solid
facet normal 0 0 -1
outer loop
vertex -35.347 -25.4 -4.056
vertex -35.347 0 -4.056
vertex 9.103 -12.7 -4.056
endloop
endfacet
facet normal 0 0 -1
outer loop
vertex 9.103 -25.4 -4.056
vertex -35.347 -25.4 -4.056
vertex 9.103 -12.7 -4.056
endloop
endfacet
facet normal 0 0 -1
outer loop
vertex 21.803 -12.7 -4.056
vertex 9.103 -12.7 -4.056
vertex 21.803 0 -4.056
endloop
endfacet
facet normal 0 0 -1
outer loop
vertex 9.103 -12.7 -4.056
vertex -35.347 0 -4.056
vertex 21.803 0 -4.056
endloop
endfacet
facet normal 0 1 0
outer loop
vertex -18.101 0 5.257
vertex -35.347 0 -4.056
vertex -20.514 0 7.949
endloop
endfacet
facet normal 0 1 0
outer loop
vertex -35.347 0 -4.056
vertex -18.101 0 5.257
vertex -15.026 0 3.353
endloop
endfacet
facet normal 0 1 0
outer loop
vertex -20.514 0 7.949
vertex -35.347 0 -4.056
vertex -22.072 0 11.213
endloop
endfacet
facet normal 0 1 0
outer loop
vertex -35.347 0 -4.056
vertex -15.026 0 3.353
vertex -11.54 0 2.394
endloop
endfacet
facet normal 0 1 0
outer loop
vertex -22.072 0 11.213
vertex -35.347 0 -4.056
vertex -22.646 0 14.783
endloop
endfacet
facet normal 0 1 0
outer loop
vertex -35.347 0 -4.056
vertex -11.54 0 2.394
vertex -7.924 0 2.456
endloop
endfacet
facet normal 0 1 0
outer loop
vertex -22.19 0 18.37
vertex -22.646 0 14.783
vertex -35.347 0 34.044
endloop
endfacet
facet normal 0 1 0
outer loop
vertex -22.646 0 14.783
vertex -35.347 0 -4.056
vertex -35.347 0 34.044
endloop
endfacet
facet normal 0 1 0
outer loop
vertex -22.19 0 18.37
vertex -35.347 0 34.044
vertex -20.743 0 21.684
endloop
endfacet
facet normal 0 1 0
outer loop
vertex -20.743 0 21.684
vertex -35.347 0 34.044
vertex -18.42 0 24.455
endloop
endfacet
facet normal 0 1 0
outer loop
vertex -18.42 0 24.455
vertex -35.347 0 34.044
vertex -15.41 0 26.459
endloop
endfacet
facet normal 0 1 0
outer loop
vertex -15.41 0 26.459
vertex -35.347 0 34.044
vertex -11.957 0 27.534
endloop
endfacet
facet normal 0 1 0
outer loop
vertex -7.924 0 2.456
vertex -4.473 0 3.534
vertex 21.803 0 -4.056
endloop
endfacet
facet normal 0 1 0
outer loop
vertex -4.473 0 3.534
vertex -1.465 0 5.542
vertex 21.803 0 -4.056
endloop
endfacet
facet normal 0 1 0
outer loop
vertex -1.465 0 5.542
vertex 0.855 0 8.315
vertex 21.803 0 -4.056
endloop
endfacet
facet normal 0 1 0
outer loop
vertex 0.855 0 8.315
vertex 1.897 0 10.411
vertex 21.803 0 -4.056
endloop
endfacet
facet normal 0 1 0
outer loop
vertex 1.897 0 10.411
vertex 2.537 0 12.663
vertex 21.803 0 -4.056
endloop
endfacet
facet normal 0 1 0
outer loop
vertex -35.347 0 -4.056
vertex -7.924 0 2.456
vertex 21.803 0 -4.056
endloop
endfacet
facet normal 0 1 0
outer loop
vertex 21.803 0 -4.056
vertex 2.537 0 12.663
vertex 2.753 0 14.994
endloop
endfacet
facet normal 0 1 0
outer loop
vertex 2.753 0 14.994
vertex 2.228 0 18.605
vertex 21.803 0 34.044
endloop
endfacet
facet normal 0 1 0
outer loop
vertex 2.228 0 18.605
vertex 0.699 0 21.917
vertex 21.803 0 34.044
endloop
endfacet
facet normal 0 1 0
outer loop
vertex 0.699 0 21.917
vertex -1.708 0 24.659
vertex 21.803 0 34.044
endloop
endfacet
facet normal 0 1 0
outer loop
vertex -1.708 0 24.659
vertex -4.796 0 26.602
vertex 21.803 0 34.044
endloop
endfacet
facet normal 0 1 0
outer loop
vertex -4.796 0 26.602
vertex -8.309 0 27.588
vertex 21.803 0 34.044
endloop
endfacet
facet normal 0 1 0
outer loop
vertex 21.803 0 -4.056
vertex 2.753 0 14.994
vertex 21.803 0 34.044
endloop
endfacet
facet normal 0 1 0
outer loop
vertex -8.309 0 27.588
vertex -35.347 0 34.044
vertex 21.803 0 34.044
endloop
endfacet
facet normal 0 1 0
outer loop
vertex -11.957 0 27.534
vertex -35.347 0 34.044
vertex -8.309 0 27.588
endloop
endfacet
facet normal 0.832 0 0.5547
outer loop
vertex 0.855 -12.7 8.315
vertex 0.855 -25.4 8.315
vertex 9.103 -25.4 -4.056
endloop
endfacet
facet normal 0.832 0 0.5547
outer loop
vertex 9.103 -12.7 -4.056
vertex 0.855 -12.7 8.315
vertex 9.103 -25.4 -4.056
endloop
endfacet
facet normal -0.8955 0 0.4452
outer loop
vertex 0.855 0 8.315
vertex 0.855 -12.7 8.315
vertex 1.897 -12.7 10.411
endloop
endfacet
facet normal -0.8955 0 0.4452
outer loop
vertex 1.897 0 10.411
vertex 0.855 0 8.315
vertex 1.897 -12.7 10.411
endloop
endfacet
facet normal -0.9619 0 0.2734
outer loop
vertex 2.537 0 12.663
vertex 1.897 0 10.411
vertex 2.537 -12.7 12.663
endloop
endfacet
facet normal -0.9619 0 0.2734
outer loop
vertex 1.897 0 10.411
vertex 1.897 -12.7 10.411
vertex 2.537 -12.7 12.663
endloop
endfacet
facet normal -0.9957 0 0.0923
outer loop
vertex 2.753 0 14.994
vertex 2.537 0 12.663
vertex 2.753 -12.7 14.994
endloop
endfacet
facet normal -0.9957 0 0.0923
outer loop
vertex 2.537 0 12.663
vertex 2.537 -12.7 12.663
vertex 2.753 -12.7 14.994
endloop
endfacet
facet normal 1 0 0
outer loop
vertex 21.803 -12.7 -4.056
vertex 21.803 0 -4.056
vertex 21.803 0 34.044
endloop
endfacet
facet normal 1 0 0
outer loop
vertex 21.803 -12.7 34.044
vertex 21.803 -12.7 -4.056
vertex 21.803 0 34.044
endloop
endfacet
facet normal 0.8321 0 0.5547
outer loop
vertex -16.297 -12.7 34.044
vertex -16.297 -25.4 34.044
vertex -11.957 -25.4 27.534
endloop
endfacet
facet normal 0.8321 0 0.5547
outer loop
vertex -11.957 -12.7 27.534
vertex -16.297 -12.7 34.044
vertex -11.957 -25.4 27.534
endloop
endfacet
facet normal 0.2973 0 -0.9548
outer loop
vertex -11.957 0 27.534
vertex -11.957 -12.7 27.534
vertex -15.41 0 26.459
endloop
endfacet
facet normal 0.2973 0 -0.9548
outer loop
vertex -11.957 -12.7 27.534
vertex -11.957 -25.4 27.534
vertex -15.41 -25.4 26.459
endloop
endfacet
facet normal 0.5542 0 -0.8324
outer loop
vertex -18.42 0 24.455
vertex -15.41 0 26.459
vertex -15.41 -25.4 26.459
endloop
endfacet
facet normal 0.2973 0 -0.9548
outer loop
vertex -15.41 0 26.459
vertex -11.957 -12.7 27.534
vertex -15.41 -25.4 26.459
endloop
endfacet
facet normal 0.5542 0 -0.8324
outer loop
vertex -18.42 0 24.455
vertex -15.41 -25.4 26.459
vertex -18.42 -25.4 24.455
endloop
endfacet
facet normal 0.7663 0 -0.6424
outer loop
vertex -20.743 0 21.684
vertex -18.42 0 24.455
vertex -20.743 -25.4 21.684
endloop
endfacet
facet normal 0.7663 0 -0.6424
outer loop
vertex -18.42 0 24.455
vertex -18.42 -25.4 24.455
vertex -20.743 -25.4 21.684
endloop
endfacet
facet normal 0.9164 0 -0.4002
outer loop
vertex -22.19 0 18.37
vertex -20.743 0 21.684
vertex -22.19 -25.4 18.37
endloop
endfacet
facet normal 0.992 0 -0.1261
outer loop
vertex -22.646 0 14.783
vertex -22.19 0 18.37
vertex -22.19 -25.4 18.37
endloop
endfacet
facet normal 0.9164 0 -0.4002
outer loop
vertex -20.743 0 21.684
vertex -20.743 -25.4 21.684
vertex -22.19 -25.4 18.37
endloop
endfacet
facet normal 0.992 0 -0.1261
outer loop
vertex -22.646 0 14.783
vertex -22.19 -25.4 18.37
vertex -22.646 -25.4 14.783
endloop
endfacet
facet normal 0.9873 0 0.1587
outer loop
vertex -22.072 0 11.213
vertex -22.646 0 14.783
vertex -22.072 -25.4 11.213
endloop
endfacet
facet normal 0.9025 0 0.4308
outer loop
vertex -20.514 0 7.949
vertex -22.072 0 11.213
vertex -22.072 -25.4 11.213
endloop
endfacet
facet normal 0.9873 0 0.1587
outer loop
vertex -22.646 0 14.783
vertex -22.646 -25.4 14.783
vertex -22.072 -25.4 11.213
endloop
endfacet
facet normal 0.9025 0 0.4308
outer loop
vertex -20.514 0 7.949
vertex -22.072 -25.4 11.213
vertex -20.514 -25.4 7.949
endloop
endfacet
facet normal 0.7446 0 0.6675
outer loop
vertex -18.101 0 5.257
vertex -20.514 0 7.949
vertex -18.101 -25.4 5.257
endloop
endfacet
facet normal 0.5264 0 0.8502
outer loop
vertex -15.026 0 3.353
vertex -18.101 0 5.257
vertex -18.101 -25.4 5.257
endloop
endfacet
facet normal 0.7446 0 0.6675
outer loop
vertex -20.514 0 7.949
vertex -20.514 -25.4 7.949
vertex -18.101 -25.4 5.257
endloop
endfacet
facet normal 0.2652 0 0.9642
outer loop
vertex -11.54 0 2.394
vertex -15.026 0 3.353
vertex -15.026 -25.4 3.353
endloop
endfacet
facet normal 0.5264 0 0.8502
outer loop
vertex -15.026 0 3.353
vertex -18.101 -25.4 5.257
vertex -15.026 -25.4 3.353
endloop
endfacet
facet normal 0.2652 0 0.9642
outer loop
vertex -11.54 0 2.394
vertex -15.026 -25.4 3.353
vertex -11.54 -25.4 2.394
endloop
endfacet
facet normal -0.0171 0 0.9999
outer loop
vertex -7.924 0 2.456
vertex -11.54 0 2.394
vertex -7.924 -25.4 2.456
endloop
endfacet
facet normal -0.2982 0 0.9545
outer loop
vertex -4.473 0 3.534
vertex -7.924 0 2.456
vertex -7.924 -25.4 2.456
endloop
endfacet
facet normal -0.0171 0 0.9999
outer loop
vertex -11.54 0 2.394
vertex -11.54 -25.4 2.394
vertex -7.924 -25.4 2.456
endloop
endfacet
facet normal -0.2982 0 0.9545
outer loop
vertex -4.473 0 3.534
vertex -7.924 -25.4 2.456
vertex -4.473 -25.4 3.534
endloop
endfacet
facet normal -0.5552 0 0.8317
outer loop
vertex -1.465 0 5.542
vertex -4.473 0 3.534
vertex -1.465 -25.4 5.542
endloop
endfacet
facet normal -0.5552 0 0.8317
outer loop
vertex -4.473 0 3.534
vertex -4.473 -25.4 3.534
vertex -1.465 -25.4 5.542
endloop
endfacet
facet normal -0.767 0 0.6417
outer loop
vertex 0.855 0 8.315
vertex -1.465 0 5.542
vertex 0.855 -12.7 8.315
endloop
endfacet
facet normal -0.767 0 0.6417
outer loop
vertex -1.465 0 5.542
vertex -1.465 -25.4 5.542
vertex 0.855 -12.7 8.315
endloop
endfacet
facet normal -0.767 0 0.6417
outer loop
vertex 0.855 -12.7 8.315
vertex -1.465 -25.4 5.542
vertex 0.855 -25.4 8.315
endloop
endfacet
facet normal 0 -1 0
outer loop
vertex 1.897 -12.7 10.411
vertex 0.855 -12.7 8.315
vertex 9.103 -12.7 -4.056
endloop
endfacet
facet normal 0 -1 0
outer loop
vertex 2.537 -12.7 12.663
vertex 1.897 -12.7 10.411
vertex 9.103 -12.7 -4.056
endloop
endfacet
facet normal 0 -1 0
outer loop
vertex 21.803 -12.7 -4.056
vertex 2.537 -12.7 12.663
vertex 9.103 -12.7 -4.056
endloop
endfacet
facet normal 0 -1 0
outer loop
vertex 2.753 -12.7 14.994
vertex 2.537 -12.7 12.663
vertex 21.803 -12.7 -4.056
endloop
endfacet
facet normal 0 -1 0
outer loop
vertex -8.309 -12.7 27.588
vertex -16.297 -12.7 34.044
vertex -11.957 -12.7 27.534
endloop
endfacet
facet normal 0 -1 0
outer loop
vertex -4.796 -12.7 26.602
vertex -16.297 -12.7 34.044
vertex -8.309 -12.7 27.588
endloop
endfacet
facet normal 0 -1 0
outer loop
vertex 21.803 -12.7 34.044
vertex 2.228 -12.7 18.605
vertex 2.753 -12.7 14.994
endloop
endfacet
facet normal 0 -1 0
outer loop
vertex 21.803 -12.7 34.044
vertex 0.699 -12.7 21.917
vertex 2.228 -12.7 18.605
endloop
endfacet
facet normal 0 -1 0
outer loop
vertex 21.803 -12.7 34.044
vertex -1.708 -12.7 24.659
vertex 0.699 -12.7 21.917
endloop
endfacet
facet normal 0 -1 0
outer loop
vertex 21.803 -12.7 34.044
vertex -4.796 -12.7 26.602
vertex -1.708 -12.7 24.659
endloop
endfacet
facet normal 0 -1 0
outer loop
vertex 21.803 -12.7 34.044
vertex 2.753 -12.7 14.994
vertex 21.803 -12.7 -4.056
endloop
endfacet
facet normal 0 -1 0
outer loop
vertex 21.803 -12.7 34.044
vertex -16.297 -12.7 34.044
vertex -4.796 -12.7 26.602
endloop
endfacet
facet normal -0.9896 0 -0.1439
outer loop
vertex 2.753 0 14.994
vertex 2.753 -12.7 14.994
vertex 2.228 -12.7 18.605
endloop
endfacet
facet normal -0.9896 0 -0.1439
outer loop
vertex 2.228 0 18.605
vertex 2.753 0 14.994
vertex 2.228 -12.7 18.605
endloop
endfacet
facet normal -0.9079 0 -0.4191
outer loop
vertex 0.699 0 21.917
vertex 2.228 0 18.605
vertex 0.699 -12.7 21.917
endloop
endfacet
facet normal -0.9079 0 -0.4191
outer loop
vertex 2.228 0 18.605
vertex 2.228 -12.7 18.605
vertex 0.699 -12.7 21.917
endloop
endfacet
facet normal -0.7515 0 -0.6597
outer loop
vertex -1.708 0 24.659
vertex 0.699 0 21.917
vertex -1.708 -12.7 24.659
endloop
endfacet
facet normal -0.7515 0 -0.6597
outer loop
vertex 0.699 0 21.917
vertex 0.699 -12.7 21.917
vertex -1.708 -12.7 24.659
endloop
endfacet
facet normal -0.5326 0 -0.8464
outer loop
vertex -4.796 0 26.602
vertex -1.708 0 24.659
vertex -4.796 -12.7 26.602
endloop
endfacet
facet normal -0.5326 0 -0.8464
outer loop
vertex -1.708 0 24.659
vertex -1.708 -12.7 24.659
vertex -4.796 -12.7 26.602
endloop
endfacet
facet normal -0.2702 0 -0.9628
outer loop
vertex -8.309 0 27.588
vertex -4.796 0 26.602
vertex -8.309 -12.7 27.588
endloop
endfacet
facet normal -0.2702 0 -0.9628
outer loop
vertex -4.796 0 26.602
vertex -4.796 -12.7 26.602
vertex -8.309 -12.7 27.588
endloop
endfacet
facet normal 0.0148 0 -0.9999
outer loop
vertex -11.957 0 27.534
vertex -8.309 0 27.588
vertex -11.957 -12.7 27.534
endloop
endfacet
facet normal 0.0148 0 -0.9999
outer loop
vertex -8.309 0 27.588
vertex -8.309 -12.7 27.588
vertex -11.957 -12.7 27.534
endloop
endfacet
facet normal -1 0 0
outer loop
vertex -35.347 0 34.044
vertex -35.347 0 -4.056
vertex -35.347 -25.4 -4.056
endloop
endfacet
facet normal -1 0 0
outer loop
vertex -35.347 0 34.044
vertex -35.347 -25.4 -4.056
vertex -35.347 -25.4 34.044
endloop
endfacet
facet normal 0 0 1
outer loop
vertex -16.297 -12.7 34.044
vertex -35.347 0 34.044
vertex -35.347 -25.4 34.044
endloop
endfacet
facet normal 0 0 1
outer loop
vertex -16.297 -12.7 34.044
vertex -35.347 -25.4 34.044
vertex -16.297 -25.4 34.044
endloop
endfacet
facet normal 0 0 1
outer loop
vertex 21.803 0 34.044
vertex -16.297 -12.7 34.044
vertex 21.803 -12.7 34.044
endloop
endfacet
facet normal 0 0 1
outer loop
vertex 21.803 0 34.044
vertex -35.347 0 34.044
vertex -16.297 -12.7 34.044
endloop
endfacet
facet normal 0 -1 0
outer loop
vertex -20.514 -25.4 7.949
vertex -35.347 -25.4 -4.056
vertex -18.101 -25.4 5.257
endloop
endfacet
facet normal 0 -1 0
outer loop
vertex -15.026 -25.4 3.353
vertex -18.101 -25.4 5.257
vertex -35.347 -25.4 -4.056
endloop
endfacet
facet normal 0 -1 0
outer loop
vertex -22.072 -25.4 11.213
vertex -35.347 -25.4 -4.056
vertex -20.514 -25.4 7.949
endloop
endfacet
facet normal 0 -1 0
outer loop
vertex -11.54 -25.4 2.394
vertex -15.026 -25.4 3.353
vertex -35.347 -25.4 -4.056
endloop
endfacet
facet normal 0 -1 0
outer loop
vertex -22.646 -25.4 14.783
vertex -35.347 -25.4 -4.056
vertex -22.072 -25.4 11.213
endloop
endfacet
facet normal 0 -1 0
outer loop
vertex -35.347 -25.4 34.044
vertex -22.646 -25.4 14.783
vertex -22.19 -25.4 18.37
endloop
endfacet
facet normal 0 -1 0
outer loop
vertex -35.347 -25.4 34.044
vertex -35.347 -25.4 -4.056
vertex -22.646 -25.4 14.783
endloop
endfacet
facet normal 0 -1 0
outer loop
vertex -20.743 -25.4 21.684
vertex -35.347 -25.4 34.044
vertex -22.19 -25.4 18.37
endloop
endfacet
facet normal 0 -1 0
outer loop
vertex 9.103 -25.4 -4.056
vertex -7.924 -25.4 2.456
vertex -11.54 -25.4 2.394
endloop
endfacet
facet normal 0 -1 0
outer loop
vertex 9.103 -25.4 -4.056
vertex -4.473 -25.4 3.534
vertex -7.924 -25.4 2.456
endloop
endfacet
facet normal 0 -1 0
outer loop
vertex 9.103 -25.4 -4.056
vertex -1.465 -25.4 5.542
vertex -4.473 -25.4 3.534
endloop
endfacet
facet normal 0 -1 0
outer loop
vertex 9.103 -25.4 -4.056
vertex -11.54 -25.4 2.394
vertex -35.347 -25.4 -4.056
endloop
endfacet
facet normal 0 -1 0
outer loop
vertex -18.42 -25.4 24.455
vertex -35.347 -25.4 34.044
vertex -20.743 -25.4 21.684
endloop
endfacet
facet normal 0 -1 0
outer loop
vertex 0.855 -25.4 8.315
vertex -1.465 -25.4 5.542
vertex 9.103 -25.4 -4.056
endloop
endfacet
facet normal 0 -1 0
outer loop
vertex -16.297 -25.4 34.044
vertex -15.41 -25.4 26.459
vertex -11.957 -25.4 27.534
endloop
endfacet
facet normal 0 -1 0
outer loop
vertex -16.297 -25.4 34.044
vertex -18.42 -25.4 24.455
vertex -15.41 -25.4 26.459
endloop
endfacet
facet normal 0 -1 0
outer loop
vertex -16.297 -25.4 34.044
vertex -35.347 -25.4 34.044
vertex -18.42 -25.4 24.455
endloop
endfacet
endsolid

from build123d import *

# Parameters (mm, degrees)
F0_W     = 57.15
F0_H     = 38.1
F1_DEPTH = 25.4
F3_DEPTH = 12.7
F5_DEPTH = 25.401


with BuildPart() as f1:
    # F0 (on Front) → F1 (new body)
    with BuildSketch(Plane.XZ):
        with Locations((-6.772434, 14.993798)):
            Rectangle(F0_W, F0_H)
    extrude(amount=F1_DEPTH)

    # F2 (on face) → F3 (cut)
    with BuildSketch(Plane.XZ.offset(25.4)):
        Polygon((21.802566, 34.043798), (-16.297434, 34.043798), (9.102566, -4.056202), (21.802566, -4.056202), align=None)
    extrude(amount=-F3_DEPTH, mode=Mode.SUBTRACT)

    # F4 (on face) → F5 (cut, through all)
    with BuildSketch(Plane.XZ.offset(25.4)):
        with BuildLine():
            Line((0.854833, 8.315398), (-11.957393, 27.533737))
            ThreePointArc((-11.957393, 27.533737), (-20.514473, 7.949105), (0.854833, 8.315398))
        make_face()
        with BuildLine():
            ThreePointArc((0.854833, 8.315398), (2.268923, 11.5224), (2.752566, 14.993798))
            ThreePointArc((2.752566, 14.993798), (-1.708395, 24.658592), (-11.957393, 27.533737))
            Line((-11.957393, 27.533737), (0.854833, 8.315398))
        make_face()
    extrude(amount=-F5_DEPTH, mode=Mode.SUBTRACT)


solid = f1.part
